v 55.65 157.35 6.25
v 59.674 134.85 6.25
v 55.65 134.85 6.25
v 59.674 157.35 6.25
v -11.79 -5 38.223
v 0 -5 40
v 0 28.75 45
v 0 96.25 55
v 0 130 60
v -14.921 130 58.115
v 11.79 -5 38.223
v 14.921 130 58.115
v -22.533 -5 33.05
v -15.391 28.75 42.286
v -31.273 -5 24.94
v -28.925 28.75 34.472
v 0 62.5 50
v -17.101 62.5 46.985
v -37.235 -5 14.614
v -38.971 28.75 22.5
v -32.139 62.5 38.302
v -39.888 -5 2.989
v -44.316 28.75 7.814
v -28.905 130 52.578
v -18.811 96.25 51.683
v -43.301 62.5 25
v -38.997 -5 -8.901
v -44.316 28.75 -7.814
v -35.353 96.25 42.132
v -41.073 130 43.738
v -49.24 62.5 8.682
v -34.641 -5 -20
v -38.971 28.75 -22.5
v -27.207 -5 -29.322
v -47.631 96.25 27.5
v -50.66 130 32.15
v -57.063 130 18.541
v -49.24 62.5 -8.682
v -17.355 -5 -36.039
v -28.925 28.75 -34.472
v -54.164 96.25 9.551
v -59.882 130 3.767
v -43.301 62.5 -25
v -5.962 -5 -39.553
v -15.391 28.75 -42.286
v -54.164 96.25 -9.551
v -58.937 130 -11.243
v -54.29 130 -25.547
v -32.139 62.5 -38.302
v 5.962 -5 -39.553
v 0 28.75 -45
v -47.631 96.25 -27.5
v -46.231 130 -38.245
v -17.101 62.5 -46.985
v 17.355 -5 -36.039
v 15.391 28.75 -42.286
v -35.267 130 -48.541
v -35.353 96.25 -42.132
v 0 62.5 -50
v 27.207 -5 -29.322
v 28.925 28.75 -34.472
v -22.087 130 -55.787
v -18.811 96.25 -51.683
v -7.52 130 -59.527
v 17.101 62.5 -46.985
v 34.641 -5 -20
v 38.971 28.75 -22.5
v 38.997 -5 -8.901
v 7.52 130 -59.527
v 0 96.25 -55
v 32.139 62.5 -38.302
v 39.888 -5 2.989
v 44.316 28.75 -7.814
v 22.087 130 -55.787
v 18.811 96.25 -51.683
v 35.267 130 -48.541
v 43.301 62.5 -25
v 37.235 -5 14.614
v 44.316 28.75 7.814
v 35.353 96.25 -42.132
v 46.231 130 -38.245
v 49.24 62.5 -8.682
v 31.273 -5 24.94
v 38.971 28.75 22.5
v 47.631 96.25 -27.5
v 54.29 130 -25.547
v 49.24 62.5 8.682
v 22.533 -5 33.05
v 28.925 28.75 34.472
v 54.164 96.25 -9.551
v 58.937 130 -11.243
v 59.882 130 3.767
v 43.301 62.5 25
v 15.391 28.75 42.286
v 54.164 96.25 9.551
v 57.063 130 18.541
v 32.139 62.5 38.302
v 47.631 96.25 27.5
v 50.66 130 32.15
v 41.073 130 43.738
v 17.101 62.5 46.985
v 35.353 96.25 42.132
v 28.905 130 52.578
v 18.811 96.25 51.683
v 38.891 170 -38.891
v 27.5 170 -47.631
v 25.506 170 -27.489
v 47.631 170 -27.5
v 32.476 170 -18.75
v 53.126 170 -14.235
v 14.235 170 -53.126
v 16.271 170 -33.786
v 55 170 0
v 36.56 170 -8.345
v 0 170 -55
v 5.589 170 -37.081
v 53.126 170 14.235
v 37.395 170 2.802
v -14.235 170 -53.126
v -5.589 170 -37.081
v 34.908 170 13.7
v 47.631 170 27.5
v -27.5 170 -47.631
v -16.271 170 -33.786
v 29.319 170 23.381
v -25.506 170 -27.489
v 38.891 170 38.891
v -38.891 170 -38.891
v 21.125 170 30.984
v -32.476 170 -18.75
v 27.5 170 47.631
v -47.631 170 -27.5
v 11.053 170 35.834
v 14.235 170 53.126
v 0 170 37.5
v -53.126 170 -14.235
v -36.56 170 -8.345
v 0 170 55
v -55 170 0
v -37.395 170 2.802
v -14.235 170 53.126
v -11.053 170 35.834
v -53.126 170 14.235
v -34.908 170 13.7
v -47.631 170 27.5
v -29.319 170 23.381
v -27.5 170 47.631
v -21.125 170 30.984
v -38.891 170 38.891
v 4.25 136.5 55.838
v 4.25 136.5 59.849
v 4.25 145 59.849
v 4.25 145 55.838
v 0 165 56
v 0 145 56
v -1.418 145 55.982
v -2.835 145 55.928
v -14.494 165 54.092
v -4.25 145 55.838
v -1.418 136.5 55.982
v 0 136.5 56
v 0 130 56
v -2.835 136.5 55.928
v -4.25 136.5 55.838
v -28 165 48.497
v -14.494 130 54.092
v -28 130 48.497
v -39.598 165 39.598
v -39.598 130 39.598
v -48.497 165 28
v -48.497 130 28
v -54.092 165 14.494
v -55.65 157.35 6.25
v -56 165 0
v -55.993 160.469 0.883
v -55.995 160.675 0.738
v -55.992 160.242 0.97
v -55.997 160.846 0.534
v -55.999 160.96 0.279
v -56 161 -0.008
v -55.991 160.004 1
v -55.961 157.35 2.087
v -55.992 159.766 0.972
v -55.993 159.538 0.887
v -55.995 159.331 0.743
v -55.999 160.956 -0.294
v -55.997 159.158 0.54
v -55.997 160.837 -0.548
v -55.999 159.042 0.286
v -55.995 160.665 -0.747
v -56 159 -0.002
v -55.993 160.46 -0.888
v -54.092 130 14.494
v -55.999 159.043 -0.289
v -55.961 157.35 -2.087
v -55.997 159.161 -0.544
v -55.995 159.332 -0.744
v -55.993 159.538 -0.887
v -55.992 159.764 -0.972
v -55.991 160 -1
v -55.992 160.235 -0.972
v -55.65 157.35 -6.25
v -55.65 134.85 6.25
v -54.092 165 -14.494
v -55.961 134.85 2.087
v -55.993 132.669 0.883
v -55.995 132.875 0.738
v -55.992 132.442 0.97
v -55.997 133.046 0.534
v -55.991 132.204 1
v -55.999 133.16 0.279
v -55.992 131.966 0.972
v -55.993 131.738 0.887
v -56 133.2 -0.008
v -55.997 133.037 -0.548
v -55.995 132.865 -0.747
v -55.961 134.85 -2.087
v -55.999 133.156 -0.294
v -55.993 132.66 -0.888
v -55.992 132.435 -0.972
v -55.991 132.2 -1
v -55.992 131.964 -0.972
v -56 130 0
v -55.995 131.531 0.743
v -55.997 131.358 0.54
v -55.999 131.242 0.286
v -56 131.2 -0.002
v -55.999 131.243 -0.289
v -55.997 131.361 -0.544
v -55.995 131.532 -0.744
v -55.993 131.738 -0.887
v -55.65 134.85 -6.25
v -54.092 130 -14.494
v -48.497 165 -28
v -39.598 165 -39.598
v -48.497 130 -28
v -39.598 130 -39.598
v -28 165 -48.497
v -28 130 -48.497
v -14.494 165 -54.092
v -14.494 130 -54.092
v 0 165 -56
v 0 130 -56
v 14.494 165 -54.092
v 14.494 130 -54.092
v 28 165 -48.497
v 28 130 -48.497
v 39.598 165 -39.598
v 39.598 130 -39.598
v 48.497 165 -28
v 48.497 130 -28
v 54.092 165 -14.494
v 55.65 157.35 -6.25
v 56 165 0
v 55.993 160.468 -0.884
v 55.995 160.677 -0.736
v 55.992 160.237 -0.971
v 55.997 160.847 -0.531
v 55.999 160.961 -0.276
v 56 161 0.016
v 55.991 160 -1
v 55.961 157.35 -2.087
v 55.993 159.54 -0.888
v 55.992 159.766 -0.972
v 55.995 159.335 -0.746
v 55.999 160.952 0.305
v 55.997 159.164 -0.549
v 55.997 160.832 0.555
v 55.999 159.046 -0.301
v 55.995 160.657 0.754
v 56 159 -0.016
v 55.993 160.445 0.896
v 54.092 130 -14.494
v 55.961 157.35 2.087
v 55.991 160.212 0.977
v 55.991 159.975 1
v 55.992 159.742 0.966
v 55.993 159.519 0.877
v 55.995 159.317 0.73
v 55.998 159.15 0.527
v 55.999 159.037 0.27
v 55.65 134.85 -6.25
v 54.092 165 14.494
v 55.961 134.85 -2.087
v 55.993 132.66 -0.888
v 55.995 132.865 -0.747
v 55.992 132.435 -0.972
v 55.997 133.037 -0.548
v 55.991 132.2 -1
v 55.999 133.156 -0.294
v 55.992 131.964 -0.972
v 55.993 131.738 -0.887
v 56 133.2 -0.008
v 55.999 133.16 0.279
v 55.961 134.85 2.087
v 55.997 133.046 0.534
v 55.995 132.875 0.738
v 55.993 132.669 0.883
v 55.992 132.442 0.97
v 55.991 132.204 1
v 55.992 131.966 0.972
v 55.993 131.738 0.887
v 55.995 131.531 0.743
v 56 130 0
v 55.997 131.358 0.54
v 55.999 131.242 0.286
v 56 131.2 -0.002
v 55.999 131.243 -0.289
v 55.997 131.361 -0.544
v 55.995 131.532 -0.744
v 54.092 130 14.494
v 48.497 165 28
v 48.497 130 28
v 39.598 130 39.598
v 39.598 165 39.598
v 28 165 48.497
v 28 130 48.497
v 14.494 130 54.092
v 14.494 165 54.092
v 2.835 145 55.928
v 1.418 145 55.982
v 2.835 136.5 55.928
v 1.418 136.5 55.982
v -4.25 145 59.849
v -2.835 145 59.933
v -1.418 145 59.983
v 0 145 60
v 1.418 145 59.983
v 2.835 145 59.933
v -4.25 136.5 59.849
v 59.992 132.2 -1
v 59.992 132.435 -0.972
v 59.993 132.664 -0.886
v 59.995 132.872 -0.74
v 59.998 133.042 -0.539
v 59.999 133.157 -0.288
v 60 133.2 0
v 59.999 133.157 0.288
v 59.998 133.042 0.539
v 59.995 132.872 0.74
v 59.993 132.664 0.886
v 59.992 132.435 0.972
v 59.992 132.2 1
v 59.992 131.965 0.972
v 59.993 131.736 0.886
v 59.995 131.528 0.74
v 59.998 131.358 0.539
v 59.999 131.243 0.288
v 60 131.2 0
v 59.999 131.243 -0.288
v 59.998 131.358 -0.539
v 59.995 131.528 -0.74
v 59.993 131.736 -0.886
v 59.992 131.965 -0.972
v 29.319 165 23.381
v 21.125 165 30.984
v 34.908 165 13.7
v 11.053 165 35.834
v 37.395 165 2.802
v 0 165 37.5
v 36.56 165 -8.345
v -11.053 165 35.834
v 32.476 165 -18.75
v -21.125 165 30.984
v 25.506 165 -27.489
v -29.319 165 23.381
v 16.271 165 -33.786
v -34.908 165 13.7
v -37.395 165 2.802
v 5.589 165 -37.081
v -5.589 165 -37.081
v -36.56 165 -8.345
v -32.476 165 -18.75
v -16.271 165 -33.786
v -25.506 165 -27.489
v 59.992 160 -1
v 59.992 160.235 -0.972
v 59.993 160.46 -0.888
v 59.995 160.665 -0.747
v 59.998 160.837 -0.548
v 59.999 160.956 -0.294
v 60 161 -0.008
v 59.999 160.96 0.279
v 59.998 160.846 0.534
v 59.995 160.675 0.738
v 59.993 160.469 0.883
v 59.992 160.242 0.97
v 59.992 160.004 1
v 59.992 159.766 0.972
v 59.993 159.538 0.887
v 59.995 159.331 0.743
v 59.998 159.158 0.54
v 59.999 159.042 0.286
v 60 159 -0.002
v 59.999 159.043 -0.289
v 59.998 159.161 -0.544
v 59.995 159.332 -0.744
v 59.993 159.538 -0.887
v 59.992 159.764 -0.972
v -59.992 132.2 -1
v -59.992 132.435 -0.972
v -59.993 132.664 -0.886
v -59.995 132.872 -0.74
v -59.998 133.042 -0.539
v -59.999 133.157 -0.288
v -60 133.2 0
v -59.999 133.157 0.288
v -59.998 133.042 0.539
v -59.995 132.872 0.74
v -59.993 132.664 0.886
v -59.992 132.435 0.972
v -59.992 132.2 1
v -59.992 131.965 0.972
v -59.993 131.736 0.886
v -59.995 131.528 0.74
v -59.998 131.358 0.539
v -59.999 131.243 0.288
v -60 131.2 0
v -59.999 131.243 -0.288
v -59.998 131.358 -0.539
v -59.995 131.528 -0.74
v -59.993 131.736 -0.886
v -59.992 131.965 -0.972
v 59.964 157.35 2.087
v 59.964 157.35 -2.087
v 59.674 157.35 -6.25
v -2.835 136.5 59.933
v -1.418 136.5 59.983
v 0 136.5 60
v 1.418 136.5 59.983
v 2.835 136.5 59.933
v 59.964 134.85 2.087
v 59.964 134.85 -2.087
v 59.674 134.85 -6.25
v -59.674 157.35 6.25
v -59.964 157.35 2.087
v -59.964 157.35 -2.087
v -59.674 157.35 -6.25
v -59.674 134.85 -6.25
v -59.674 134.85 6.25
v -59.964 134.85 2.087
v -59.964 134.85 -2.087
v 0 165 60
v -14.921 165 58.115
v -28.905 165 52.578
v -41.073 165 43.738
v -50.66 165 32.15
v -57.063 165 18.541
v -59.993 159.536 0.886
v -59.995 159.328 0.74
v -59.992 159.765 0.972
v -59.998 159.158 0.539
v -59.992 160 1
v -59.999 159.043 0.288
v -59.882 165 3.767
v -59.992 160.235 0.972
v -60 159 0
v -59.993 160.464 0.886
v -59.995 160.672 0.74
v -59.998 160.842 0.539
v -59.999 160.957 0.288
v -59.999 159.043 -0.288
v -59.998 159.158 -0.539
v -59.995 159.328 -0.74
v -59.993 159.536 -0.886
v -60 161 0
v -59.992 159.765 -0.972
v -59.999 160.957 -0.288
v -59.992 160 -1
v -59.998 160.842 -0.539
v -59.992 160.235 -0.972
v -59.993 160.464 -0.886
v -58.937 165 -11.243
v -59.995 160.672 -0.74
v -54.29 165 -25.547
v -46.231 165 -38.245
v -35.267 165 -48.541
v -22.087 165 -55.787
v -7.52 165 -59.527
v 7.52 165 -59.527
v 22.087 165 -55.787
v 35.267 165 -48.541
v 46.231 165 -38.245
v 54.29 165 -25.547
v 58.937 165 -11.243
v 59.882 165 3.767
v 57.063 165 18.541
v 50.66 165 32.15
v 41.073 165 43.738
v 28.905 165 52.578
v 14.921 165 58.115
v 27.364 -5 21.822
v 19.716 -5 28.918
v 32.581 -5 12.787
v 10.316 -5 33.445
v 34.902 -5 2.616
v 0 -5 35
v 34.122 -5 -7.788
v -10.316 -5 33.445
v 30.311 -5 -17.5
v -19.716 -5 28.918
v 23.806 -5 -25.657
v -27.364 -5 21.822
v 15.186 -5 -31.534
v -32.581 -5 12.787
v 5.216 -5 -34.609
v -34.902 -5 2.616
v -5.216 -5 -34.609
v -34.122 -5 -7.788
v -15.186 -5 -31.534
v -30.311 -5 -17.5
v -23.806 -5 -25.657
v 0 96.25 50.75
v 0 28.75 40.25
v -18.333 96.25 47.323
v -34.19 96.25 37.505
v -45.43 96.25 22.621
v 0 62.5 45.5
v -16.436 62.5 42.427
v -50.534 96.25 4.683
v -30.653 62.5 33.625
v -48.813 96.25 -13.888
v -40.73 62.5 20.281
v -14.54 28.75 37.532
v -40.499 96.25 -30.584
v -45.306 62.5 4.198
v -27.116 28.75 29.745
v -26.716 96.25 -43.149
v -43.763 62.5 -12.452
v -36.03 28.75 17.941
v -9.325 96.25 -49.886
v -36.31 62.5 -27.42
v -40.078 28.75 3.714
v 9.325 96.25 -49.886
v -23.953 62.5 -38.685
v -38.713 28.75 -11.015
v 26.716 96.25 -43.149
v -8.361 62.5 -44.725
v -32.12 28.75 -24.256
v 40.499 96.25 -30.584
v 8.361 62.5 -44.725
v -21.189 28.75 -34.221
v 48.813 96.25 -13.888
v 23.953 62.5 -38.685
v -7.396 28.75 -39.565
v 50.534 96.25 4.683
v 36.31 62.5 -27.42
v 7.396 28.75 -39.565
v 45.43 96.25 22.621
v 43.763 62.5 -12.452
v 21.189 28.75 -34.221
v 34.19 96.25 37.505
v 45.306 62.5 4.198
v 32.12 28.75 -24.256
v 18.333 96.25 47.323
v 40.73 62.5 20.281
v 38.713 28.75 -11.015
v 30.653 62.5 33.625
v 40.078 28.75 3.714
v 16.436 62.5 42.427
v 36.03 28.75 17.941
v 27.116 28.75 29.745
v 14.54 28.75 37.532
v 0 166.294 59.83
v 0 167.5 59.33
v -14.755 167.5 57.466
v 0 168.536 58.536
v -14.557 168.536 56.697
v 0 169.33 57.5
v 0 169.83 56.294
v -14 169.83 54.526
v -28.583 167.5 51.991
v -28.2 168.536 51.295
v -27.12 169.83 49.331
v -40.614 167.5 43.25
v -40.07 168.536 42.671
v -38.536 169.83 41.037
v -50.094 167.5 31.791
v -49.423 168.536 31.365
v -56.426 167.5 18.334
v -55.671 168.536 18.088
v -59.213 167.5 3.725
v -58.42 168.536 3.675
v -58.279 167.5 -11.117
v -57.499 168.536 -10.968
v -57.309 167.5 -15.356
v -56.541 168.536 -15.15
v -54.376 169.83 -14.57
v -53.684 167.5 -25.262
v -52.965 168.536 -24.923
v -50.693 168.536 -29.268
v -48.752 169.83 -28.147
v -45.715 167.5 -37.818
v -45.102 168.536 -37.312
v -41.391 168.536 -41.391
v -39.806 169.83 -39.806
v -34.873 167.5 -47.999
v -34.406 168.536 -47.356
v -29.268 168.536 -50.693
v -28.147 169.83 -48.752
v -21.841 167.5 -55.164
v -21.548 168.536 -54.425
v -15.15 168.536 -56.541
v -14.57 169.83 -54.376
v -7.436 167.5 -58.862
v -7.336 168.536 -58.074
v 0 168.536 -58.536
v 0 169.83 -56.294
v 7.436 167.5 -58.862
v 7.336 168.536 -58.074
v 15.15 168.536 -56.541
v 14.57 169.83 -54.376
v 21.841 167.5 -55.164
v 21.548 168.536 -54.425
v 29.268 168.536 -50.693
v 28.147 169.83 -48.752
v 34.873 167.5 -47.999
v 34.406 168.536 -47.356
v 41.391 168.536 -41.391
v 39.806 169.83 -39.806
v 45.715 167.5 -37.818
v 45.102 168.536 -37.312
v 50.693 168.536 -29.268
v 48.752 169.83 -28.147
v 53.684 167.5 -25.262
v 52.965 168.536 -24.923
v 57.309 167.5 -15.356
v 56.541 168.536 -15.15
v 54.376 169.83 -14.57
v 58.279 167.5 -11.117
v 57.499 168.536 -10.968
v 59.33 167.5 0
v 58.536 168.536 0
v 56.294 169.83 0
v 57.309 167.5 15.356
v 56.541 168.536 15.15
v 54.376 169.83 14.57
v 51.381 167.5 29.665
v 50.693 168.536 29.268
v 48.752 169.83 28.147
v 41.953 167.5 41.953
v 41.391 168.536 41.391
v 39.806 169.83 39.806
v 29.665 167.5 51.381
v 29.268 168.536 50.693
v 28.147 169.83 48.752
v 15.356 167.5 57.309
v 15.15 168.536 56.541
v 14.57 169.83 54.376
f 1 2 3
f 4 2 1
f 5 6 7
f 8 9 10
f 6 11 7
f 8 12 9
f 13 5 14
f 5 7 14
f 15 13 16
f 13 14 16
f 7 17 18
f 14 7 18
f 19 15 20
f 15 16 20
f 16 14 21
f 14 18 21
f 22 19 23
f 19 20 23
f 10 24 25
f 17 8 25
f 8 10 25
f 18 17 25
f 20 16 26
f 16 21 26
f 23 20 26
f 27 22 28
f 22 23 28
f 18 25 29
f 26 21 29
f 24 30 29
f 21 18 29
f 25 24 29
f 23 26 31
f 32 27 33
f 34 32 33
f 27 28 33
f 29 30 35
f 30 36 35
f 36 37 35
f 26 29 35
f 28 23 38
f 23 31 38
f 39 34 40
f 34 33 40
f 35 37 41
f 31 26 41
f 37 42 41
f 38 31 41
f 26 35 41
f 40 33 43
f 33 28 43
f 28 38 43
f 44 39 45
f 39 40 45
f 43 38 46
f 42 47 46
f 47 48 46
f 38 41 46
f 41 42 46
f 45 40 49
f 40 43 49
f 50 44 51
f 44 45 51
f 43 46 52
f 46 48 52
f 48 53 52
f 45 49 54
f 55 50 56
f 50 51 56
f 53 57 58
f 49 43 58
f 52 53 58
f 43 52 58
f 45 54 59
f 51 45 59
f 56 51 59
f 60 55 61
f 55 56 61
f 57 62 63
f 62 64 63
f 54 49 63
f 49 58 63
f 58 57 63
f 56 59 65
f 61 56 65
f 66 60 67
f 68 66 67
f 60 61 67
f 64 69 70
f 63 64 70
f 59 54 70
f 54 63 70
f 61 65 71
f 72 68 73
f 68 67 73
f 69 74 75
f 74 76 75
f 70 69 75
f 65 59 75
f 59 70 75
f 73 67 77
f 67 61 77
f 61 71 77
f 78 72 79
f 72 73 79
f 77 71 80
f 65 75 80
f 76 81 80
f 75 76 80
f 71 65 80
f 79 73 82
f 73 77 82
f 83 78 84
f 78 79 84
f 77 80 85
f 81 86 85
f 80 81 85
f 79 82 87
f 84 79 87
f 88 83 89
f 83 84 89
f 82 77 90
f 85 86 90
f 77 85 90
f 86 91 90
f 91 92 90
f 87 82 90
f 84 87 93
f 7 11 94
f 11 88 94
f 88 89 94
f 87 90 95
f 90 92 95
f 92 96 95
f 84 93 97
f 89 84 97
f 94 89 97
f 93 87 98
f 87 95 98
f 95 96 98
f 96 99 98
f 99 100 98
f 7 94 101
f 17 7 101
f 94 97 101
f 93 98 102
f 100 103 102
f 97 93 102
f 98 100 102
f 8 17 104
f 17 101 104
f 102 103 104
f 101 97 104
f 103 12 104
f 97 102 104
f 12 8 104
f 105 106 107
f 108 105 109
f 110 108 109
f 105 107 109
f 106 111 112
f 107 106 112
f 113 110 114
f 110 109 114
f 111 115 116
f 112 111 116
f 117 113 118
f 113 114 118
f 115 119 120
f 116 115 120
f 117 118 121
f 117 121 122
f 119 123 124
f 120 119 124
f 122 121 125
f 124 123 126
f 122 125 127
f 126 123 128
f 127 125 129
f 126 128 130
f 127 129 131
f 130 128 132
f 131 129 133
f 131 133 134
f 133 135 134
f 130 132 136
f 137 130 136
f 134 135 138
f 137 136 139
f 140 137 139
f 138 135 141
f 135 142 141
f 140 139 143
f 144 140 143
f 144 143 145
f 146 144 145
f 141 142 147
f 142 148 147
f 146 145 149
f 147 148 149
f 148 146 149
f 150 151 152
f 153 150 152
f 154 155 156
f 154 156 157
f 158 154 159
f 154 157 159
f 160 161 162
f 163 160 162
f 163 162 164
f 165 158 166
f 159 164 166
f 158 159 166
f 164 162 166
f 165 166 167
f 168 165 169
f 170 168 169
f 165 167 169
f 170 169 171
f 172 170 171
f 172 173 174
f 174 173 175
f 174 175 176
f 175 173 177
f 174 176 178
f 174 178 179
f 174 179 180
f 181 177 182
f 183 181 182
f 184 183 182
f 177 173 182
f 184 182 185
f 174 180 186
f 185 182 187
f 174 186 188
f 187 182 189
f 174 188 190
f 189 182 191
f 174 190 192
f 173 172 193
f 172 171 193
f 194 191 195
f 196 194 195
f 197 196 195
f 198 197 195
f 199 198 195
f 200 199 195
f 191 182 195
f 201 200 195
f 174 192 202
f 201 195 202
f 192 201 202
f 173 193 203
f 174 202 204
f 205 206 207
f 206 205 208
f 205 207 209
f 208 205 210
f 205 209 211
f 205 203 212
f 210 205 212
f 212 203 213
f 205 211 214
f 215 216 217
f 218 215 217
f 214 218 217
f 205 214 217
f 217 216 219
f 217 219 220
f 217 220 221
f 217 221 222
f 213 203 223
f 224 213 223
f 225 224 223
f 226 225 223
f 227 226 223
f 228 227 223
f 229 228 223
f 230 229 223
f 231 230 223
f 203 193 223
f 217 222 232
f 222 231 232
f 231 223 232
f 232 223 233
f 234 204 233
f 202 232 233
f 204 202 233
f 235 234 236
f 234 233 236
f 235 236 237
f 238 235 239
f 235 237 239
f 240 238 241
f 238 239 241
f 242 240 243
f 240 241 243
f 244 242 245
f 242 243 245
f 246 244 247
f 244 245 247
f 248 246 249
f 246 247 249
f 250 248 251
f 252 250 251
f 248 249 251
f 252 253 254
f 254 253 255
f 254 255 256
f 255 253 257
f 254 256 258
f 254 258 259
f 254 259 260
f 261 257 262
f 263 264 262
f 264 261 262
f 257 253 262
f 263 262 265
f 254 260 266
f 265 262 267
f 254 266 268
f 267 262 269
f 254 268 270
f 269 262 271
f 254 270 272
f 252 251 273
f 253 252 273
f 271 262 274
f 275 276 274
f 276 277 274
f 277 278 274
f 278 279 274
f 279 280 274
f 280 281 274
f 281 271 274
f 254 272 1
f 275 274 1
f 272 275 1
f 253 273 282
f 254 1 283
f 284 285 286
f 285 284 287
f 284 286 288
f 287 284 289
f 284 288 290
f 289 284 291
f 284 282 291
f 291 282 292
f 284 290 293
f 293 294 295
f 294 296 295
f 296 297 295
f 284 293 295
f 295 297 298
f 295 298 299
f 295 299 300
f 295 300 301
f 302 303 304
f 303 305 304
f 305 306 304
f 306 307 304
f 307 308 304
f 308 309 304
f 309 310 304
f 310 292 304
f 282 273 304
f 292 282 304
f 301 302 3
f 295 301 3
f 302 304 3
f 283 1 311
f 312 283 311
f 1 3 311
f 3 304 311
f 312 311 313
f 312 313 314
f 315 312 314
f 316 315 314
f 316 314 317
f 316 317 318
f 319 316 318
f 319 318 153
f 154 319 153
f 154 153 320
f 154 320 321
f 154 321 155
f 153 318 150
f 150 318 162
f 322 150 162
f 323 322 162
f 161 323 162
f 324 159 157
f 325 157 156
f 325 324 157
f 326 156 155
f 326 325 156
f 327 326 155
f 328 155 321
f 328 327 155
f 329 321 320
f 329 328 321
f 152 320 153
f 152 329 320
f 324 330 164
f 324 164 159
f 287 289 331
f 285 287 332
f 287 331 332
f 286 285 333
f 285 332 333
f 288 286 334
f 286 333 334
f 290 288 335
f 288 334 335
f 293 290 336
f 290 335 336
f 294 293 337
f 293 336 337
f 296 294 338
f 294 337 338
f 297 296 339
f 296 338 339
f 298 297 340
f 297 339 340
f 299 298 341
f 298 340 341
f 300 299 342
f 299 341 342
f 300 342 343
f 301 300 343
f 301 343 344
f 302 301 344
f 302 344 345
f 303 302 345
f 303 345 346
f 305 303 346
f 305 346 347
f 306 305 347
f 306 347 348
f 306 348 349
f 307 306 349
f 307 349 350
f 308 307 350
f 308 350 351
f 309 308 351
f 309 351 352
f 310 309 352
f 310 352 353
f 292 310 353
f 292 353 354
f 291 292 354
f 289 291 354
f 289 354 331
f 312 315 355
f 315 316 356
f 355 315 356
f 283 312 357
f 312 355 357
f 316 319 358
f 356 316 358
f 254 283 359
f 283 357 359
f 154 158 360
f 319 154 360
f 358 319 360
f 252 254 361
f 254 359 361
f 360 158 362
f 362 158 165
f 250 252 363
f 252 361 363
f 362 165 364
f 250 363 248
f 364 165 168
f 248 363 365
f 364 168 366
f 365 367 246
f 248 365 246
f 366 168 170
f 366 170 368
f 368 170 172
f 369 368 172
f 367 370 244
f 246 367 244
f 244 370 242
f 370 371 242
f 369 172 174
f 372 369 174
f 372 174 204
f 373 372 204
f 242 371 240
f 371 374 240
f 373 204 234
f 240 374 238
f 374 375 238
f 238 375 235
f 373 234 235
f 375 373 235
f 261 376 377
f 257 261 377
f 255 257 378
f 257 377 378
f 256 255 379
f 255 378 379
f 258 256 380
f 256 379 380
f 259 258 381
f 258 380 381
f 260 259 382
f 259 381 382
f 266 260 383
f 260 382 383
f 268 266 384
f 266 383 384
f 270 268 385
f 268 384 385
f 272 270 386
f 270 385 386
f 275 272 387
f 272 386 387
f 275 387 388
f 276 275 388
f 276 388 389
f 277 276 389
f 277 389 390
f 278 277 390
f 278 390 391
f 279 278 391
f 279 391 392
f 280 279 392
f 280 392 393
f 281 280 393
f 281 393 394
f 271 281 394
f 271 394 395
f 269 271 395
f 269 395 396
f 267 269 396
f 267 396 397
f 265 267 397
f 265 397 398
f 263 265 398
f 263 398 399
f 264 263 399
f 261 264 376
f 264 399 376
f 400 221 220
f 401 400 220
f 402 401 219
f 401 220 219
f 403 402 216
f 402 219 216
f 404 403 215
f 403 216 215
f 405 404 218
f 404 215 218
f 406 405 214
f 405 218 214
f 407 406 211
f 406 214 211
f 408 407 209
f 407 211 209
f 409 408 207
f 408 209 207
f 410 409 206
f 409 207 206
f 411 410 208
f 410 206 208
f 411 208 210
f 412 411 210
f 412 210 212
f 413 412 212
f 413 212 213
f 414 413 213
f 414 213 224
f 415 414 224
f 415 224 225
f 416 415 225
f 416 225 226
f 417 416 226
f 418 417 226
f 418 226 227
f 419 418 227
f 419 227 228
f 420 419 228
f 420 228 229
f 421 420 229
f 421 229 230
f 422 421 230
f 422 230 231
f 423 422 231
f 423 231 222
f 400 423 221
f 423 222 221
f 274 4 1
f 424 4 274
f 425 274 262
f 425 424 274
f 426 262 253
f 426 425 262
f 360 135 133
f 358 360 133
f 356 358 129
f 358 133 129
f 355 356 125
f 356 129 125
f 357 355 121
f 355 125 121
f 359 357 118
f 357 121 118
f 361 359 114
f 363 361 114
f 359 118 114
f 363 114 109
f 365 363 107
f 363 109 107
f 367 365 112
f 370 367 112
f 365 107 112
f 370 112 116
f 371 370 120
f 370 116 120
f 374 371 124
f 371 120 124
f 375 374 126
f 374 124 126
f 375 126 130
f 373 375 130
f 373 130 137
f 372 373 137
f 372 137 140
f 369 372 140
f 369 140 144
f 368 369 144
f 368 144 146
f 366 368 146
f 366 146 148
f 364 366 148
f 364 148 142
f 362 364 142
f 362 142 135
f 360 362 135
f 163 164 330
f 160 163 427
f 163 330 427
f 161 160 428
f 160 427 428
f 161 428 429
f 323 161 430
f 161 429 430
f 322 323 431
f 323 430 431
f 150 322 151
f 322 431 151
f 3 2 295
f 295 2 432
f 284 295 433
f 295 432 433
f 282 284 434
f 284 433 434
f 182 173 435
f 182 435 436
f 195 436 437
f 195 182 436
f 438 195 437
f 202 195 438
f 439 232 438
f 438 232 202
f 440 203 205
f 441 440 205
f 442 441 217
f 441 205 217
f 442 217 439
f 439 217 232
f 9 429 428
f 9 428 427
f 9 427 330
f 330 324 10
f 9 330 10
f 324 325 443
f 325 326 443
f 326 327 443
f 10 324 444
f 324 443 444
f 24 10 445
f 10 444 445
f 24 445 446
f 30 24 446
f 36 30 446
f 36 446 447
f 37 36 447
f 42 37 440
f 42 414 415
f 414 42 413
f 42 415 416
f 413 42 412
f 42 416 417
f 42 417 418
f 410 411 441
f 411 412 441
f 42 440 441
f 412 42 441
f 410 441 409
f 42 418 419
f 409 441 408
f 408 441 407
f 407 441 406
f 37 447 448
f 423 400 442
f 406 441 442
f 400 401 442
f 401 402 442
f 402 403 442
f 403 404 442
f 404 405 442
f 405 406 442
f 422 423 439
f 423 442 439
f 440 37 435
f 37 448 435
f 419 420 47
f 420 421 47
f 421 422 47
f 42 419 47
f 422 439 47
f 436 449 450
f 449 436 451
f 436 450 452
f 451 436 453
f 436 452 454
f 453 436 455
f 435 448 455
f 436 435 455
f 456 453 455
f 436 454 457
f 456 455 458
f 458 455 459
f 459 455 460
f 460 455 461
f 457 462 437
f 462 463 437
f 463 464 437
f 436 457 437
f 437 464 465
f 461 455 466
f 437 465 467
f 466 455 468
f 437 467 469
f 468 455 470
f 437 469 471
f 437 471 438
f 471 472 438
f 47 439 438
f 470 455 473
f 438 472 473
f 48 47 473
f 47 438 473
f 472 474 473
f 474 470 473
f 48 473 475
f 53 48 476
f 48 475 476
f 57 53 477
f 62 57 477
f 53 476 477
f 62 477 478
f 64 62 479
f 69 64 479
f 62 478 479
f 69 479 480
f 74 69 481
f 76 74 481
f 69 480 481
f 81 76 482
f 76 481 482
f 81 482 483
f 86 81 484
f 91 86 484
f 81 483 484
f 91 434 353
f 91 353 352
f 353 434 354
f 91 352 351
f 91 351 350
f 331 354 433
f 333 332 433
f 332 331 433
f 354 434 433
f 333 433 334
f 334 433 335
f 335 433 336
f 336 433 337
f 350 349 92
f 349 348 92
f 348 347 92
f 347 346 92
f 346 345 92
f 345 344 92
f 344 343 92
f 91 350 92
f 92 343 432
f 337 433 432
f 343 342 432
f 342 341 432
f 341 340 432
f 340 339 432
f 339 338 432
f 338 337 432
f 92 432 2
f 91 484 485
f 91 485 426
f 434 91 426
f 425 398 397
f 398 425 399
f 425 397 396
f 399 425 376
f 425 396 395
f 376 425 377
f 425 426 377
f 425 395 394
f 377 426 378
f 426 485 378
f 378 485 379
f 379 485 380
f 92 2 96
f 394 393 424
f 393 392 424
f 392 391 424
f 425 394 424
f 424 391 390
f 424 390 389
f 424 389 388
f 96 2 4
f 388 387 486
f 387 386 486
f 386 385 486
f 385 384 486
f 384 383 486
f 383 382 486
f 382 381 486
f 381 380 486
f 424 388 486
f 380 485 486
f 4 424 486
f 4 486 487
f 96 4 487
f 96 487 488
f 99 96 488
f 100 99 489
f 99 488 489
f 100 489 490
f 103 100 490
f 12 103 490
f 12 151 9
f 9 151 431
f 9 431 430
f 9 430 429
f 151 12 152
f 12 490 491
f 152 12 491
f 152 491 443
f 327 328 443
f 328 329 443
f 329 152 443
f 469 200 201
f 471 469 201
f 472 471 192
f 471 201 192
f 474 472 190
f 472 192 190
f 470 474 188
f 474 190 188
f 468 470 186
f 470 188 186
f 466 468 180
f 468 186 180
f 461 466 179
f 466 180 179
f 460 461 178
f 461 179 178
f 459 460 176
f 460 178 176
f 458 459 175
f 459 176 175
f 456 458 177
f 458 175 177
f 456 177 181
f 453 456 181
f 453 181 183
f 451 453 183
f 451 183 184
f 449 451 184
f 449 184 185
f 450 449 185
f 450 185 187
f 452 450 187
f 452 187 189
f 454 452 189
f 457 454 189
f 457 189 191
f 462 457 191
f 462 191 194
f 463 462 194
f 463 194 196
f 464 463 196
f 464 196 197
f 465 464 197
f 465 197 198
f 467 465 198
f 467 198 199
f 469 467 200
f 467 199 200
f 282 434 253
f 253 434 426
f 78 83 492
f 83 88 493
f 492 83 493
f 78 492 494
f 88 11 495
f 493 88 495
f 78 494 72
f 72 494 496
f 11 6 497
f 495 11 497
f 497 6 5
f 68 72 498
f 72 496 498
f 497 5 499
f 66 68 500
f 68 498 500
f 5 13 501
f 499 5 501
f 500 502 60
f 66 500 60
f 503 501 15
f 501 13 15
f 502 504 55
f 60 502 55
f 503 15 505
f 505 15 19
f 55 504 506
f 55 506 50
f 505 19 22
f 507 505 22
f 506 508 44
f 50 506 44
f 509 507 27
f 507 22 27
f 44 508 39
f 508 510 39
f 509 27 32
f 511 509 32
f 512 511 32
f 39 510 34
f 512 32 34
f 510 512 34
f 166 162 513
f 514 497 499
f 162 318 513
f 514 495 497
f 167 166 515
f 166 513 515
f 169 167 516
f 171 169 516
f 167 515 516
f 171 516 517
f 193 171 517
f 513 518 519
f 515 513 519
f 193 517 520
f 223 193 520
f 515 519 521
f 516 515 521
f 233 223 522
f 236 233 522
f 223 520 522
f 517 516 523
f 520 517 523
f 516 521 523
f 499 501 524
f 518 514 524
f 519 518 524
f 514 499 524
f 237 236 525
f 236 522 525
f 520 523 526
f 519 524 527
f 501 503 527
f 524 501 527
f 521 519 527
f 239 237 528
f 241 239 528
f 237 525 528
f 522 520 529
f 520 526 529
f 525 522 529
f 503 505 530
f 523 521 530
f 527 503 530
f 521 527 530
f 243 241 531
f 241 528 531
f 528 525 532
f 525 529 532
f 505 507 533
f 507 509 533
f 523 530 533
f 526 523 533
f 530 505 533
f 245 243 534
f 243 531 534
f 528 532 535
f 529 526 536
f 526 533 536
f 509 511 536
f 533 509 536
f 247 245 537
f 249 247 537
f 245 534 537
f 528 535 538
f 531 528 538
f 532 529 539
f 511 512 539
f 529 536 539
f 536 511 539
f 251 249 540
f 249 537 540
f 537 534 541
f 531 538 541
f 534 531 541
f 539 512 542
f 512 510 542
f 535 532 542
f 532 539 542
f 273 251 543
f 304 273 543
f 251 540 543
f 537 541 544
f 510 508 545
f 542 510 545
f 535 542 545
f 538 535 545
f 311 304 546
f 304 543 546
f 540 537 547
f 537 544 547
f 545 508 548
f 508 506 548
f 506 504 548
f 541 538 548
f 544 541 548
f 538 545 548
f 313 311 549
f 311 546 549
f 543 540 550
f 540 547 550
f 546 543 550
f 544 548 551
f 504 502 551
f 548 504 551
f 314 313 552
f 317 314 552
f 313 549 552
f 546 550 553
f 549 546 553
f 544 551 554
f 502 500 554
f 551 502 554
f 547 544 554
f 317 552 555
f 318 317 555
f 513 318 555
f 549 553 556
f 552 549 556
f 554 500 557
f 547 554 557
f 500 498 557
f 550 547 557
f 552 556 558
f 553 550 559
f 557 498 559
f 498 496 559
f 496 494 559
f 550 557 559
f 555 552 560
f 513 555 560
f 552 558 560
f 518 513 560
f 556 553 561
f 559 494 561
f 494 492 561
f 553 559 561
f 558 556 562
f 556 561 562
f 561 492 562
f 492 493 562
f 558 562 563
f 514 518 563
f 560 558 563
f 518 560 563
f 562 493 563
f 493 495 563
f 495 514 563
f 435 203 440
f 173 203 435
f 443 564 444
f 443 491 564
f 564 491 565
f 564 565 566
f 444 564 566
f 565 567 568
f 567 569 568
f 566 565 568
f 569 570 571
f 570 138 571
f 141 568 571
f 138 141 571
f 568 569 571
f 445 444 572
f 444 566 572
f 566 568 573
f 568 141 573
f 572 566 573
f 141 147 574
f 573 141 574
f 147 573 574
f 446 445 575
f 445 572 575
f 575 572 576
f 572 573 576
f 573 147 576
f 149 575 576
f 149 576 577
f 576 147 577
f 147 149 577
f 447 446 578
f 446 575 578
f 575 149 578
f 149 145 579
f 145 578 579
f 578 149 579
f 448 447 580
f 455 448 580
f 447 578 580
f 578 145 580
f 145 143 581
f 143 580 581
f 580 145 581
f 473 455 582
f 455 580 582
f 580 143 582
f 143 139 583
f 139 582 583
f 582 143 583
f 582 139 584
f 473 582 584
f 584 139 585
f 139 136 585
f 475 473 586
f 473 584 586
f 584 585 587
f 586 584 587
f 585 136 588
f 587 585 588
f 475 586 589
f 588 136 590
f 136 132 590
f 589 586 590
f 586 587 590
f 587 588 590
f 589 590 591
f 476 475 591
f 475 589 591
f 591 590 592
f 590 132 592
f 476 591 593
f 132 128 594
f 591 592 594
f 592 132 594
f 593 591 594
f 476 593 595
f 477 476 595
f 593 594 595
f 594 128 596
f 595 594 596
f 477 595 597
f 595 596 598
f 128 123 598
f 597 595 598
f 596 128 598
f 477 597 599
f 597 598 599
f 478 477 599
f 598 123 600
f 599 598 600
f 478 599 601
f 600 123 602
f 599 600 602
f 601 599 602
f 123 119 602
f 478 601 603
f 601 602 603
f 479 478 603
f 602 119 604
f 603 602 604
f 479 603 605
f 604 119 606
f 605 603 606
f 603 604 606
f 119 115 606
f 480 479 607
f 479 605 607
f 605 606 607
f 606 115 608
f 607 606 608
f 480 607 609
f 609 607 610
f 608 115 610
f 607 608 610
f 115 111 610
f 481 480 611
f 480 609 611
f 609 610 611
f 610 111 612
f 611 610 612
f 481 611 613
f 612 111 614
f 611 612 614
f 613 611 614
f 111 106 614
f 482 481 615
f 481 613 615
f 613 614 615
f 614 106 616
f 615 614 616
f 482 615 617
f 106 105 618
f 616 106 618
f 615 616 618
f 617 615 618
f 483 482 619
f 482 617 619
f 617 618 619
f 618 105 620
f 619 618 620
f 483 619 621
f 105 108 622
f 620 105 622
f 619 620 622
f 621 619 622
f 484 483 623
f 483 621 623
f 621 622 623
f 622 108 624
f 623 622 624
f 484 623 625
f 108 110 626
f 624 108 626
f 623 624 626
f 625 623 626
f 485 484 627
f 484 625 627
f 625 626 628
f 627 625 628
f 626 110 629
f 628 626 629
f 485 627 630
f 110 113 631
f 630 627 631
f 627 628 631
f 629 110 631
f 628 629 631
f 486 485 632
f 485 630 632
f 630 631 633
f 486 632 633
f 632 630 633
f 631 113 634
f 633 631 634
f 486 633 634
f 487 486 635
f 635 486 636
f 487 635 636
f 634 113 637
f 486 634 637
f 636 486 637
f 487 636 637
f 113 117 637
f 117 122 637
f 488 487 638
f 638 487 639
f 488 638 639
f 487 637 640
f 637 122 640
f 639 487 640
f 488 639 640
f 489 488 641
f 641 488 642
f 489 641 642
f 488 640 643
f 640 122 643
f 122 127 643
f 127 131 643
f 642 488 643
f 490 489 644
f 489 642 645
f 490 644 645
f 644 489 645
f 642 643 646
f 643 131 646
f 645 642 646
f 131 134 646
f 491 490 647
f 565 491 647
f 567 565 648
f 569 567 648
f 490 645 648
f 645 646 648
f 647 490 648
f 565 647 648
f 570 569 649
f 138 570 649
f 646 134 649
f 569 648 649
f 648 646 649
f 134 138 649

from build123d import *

# Parameters (mm, degrees)
SKETCH4_R               = 1
SKETCH4_W               = 12.5
SKETCH4_H               = 22.5
CUT_EXTRUDE2_DEPTH      = 217.564078277
CUT_EXTRUDE3_REACH      = 196.487
SKETCH5_R               = 37.5
FILLET1_R               = 5
CUT_EXTRUDE4_REACH      = 218.564
CUT_EXTRUDE4_END_RADIUS = 56
SKETCH6_W               = 8.5
SKETCH6_H               = 8.5


with BuildPart() as part:
    # Sketch2 → Revolve1 (revolve)
    with BuildSketch(Plane.XY, mode=Mode.PRIVATE) as revolve1_sk:
        Polygon((35, -5), (40, -5), (60, 130), (60, 170), (0, 170), (0, 165), (56, 165), (56, 130), align=None)
    revolve(revolve1_sk.sketch.rotate(Axis((0, 170, 0), (0, -1, 0)), 90), axis=Axis((0, 170, 0), (0, -1, 0)))

    # Sketch4 → Cut-Extrude2 (cut, through all)
    with BuildSketch(Plane(origin=(60, 0, 0), x_dir=(0, 0, -1), z_dir=(1, 0, 0))):
        with Locations((0, 132.2)):
            Circle(SKETCH4_R)
        with Locations((0, 160)):
            Circle(SKETCH4_R)
        with Locations((0, 146.1)):
            Rectangle(SKETCH4_W, SKETCH4_H)
    extrude(amount=-CUT_EXTRUDE2_DEPTH, mode=Mode.SUBTRACT)

    # Sketch5 → Cut-Extrude3 (cut, up to next)
    with BuildSketch(Plane(origin=(0, 170, 0), x_dir=(1, 0, 0), z_dir=(0, 1, 0)), mode=Mode.PRIVATE) as cut_extrude3_sk1:
        with Locations(Location((0, 0, 0), (0, 0, 270))):
            Circle(SKETCH5_R)
    cut_extrude3_tool1 = extrude(cut_extrude3_sk1.sketch, amount=-CUT_EXTRUDE3_REACH, mode=Mode.PRIVATE) & part.part
    add(cut_extrude3_tool1.solids().sort_by_distance((0, 170, 0))[0], mode=Mode.SUBTRACT)

    # Fillet1
    fillet1_edges = [part.edges().sort_by_distance(p)[0] for p in [
        (0, 170, -60),
    ]]
    fillet(fillet1_edges, radius=FILLET1_R)

    # Cut-Extrude4: up to this cylinder (the profile starts outside it)
    cut_extrude4_end = Plane(origin=(0, 140.75, 0), z_dir=(0, 1, 0)) * Cylinder(CUT_EXTRUDE4_END_RADIUS, 550.128, mode=Mode.PRIVATE)
    # Sketch6 → Cut-Extrude4 (cut, up to the surface)
    with BuildSketch(Plane.XY.offset(60), mode=Mode.PRIVATE) as cut_extrude4_sk1:
        with Locations((0, 140.75)):
            Rectangle(SKETCH6_W, SKETCH6_H)
    cut_extrude4_tool1 = extrude(cut_extrude4_sk1.sketch, amount=-CUT_EXTRUDE4_REACH, mode=Mode.PRIVATE) - cut_extrude4_end
    add(cut_extrude4_tool1.solids().sort_by_distance((0, 140.75, 60))[0], mode=Mode.SUBTRACT)


solid = part.part
